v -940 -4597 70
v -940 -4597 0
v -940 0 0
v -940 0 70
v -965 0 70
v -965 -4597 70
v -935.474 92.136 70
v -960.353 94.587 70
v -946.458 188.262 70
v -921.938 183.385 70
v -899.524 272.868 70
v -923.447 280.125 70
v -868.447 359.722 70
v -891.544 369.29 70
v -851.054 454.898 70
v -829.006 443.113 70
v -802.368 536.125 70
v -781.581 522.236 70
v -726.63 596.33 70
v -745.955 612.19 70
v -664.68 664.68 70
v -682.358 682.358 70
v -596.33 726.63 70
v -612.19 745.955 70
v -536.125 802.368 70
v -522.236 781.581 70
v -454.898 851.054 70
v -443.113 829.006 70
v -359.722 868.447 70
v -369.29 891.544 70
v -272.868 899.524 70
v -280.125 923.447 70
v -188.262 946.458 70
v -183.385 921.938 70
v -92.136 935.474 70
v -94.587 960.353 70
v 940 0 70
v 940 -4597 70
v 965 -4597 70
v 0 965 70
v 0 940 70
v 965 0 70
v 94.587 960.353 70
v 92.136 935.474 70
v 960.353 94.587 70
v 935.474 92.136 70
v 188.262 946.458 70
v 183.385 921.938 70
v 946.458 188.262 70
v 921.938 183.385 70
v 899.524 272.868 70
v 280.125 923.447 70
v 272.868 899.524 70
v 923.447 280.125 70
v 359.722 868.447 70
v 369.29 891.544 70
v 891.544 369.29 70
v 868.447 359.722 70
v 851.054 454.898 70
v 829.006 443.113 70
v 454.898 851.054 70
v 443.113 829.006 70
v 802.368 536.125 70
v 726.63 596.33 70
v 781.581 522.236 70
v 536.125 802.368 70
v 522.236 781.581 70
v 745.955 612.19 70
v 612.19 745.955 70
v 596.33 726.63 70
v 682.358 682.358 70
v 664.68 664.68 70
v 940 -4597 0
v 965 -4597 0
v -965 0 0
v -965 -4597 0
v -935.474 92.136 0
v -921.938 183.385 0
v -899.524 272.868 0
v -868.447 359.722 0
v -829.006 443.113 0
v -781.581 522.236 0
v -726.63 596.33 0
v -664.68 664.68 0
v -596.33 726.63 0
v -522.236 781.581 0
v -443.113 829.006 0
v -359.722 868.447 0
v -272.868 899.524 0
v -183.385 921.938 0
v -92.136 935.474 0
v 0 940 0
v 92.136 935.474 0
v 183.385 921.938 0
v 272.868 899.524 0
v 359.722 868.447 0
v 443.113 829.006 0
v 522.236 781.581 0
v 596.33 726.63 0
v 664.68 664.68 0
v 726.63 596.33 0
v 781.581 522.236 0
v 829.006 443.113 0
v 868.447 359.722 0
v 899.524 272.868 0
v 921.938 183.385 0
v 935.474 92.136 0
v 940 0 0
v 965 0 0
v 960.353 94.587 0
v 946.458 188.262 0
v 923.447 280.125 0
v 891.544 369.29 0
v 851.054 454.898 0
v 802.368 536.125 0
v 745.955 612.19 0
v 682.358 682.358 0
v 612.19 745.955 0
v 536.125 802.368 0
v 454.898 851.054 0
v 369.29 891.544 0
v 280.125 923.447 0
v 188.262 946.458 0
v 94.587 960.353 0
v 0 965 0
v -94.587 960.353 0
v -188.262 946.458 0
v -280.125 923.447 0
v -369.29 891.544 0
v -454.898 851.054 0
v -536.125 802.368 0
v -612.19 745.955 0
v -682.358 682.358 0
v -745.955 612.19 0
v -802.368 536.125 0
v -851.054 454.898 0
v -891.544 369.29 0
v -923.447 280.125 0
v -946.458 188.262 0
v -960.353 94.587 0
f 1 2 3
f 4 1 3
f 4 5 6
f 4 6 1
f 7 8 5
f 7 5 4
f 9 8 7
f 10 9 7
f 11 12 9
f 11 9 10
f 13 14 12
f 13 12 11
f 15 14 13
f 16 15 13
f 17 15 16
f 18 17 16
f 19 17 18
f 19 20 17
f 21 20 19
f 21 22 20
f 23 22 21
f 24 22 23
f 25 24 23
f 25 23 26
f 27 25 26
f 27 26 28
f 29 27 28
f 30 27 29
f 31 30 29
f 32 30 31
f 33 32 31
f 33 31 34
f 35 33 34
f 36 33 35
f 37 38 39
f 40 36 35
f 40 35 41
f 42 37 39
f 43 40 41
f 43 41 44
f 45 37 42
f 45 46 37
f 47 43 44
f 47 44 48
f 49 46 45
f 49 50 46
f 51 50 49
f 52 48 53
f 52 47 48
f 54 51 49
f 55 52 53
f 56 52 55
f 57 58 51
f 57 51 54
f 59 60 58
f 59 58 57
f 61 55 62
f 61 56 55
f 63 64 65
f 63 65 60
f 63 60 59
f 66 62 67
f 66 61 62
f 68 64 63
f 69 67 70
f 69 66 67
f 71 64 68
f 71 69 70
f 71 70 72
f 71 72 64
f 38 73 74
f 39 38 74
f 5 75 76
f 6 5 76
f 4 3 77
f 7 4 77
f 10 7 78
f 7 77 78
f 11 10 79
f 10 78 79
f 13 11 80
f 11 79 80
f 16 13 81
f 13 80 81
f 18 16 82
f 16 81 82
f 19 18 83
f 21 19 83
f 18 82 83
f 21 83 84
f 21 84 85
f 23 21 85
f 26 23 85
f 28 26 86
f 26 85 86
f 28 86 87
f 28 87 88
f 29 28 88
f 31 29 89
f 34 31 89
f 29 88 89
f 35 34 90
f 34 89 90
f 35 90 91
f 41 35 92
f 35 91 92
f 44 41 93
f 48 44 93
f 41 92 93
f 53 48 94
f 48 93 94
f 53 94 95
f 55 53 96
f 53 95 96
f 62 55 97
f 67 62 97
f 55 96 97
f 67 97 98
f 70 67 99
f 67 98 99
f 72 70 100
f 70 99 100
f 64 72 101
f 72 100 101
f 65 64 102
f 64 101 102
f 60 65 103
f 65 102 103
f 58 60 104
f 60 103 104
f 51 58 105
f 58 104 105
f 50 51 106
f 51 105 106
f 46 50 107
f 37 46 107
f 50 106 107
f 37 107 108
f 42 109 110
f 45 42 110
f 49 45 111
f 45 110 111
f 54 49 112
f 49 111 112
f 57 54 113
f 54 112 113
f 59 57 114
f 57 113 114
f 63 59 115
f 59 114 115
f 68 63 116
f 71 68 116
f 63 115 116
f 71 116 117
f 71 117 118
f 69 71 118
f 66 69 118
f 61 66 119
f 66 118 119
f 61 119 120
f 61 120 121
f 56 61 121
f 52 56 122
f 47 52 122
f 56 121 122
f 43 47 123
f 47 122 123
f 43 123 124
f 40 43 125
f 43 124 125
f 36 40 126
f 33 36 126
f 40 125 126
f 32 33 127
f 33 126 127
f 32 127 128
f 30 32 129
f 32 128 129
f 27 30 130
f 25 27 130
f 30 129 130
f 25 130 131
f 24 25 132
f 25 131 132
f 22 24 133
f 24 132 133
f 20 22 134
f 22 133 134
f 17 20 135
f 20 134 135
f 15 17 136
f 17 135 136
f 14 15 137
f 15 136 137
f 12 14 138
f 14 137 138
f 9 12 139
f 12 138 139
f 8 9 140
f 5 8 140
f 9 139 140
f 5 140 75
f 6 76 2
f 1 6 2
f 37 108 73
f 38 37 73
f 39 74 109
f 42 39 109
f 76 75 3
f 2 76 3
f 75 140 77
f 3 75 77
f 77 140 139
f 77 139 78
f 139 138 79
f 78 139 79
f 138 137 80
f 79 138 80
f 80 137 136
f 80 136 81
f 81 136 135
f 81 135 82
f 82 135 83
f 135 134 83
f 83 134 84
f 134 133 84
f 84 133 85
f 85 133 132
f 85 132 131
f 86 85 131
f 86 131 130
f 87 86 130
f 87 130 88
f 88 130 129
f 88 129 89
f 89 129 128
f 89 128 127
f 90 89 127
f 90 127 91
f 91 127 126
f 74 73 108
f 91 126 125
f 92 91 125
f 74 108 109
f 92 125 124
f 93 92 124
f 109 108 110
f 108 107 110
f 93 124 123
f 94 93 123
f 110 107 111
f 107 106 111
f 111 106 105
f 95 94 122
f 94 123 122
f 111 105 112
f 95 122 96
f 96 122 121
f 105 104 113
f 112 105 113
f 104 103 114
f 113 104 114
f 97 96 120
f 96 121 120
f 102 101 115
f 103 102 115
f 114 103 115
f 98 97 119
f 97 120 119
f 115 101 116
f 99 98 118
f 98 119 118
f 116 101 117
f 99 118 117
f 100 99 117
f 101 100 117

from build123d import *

# Parameters (mm, degrees)
SKETCH1_W             = 25
SKETCH1_H             = 4897
BOSS_EXTRUDE1_DEPTH   = 70
BOSS_EXTRUDE1_2_DEPTH = 70
BOSS_EXTRUDE1_3_DEPTH = 70


# Read off the part's stored shape, not the designer's step: Split1
with BuildPart() as part:
    # Sketch1 → Boss-Extrude1 (new body)
    with BuildSketch(Plane.XY):
        with Locations((-732.5, -2448.5)):
            Rectangle(SKETCH1_W, SKETCH1_H)
    extrude(amount=BOSS_EXTRUDE1_DEPTH)


with BuildPart() as body_2:
    # Sketch1 → Boss-Extrude1 2 (new body)
    with BuildSketch(Plane.XY):
        with Locations((732.5, -2448.5)):
            Rectangle(SKETCH1_W, SKETCH1_H)
    extrude(amount=BOSS_EXTRUDE1_2_DEPTH)


with BuildPart() as body_3:
    # Sketch1 → Boss-Extrude1 3 (new body)
    with BuildSketch(Plane.XY):
        with BuildLine():
            Line((940, 0), (940, -4597))
            Line((940, -4597), (965, -4597))
            Line((965, -4597), (965, 0))
            ThreePointArc((965, 0), (0, 965), (-965, 0))
            Line((-965, 0), (-965, -4597))
            Line((-965, -4597), (-940, -4597))
            Line((-940, -4597), (-940, 0))
            ThreePointArc((-940, 0), (0, 940), (940, 0))
        make_face()
    extrude(amount=BOSS_EXTRUDE1_3_DEPTH)


solid = body_3.part
